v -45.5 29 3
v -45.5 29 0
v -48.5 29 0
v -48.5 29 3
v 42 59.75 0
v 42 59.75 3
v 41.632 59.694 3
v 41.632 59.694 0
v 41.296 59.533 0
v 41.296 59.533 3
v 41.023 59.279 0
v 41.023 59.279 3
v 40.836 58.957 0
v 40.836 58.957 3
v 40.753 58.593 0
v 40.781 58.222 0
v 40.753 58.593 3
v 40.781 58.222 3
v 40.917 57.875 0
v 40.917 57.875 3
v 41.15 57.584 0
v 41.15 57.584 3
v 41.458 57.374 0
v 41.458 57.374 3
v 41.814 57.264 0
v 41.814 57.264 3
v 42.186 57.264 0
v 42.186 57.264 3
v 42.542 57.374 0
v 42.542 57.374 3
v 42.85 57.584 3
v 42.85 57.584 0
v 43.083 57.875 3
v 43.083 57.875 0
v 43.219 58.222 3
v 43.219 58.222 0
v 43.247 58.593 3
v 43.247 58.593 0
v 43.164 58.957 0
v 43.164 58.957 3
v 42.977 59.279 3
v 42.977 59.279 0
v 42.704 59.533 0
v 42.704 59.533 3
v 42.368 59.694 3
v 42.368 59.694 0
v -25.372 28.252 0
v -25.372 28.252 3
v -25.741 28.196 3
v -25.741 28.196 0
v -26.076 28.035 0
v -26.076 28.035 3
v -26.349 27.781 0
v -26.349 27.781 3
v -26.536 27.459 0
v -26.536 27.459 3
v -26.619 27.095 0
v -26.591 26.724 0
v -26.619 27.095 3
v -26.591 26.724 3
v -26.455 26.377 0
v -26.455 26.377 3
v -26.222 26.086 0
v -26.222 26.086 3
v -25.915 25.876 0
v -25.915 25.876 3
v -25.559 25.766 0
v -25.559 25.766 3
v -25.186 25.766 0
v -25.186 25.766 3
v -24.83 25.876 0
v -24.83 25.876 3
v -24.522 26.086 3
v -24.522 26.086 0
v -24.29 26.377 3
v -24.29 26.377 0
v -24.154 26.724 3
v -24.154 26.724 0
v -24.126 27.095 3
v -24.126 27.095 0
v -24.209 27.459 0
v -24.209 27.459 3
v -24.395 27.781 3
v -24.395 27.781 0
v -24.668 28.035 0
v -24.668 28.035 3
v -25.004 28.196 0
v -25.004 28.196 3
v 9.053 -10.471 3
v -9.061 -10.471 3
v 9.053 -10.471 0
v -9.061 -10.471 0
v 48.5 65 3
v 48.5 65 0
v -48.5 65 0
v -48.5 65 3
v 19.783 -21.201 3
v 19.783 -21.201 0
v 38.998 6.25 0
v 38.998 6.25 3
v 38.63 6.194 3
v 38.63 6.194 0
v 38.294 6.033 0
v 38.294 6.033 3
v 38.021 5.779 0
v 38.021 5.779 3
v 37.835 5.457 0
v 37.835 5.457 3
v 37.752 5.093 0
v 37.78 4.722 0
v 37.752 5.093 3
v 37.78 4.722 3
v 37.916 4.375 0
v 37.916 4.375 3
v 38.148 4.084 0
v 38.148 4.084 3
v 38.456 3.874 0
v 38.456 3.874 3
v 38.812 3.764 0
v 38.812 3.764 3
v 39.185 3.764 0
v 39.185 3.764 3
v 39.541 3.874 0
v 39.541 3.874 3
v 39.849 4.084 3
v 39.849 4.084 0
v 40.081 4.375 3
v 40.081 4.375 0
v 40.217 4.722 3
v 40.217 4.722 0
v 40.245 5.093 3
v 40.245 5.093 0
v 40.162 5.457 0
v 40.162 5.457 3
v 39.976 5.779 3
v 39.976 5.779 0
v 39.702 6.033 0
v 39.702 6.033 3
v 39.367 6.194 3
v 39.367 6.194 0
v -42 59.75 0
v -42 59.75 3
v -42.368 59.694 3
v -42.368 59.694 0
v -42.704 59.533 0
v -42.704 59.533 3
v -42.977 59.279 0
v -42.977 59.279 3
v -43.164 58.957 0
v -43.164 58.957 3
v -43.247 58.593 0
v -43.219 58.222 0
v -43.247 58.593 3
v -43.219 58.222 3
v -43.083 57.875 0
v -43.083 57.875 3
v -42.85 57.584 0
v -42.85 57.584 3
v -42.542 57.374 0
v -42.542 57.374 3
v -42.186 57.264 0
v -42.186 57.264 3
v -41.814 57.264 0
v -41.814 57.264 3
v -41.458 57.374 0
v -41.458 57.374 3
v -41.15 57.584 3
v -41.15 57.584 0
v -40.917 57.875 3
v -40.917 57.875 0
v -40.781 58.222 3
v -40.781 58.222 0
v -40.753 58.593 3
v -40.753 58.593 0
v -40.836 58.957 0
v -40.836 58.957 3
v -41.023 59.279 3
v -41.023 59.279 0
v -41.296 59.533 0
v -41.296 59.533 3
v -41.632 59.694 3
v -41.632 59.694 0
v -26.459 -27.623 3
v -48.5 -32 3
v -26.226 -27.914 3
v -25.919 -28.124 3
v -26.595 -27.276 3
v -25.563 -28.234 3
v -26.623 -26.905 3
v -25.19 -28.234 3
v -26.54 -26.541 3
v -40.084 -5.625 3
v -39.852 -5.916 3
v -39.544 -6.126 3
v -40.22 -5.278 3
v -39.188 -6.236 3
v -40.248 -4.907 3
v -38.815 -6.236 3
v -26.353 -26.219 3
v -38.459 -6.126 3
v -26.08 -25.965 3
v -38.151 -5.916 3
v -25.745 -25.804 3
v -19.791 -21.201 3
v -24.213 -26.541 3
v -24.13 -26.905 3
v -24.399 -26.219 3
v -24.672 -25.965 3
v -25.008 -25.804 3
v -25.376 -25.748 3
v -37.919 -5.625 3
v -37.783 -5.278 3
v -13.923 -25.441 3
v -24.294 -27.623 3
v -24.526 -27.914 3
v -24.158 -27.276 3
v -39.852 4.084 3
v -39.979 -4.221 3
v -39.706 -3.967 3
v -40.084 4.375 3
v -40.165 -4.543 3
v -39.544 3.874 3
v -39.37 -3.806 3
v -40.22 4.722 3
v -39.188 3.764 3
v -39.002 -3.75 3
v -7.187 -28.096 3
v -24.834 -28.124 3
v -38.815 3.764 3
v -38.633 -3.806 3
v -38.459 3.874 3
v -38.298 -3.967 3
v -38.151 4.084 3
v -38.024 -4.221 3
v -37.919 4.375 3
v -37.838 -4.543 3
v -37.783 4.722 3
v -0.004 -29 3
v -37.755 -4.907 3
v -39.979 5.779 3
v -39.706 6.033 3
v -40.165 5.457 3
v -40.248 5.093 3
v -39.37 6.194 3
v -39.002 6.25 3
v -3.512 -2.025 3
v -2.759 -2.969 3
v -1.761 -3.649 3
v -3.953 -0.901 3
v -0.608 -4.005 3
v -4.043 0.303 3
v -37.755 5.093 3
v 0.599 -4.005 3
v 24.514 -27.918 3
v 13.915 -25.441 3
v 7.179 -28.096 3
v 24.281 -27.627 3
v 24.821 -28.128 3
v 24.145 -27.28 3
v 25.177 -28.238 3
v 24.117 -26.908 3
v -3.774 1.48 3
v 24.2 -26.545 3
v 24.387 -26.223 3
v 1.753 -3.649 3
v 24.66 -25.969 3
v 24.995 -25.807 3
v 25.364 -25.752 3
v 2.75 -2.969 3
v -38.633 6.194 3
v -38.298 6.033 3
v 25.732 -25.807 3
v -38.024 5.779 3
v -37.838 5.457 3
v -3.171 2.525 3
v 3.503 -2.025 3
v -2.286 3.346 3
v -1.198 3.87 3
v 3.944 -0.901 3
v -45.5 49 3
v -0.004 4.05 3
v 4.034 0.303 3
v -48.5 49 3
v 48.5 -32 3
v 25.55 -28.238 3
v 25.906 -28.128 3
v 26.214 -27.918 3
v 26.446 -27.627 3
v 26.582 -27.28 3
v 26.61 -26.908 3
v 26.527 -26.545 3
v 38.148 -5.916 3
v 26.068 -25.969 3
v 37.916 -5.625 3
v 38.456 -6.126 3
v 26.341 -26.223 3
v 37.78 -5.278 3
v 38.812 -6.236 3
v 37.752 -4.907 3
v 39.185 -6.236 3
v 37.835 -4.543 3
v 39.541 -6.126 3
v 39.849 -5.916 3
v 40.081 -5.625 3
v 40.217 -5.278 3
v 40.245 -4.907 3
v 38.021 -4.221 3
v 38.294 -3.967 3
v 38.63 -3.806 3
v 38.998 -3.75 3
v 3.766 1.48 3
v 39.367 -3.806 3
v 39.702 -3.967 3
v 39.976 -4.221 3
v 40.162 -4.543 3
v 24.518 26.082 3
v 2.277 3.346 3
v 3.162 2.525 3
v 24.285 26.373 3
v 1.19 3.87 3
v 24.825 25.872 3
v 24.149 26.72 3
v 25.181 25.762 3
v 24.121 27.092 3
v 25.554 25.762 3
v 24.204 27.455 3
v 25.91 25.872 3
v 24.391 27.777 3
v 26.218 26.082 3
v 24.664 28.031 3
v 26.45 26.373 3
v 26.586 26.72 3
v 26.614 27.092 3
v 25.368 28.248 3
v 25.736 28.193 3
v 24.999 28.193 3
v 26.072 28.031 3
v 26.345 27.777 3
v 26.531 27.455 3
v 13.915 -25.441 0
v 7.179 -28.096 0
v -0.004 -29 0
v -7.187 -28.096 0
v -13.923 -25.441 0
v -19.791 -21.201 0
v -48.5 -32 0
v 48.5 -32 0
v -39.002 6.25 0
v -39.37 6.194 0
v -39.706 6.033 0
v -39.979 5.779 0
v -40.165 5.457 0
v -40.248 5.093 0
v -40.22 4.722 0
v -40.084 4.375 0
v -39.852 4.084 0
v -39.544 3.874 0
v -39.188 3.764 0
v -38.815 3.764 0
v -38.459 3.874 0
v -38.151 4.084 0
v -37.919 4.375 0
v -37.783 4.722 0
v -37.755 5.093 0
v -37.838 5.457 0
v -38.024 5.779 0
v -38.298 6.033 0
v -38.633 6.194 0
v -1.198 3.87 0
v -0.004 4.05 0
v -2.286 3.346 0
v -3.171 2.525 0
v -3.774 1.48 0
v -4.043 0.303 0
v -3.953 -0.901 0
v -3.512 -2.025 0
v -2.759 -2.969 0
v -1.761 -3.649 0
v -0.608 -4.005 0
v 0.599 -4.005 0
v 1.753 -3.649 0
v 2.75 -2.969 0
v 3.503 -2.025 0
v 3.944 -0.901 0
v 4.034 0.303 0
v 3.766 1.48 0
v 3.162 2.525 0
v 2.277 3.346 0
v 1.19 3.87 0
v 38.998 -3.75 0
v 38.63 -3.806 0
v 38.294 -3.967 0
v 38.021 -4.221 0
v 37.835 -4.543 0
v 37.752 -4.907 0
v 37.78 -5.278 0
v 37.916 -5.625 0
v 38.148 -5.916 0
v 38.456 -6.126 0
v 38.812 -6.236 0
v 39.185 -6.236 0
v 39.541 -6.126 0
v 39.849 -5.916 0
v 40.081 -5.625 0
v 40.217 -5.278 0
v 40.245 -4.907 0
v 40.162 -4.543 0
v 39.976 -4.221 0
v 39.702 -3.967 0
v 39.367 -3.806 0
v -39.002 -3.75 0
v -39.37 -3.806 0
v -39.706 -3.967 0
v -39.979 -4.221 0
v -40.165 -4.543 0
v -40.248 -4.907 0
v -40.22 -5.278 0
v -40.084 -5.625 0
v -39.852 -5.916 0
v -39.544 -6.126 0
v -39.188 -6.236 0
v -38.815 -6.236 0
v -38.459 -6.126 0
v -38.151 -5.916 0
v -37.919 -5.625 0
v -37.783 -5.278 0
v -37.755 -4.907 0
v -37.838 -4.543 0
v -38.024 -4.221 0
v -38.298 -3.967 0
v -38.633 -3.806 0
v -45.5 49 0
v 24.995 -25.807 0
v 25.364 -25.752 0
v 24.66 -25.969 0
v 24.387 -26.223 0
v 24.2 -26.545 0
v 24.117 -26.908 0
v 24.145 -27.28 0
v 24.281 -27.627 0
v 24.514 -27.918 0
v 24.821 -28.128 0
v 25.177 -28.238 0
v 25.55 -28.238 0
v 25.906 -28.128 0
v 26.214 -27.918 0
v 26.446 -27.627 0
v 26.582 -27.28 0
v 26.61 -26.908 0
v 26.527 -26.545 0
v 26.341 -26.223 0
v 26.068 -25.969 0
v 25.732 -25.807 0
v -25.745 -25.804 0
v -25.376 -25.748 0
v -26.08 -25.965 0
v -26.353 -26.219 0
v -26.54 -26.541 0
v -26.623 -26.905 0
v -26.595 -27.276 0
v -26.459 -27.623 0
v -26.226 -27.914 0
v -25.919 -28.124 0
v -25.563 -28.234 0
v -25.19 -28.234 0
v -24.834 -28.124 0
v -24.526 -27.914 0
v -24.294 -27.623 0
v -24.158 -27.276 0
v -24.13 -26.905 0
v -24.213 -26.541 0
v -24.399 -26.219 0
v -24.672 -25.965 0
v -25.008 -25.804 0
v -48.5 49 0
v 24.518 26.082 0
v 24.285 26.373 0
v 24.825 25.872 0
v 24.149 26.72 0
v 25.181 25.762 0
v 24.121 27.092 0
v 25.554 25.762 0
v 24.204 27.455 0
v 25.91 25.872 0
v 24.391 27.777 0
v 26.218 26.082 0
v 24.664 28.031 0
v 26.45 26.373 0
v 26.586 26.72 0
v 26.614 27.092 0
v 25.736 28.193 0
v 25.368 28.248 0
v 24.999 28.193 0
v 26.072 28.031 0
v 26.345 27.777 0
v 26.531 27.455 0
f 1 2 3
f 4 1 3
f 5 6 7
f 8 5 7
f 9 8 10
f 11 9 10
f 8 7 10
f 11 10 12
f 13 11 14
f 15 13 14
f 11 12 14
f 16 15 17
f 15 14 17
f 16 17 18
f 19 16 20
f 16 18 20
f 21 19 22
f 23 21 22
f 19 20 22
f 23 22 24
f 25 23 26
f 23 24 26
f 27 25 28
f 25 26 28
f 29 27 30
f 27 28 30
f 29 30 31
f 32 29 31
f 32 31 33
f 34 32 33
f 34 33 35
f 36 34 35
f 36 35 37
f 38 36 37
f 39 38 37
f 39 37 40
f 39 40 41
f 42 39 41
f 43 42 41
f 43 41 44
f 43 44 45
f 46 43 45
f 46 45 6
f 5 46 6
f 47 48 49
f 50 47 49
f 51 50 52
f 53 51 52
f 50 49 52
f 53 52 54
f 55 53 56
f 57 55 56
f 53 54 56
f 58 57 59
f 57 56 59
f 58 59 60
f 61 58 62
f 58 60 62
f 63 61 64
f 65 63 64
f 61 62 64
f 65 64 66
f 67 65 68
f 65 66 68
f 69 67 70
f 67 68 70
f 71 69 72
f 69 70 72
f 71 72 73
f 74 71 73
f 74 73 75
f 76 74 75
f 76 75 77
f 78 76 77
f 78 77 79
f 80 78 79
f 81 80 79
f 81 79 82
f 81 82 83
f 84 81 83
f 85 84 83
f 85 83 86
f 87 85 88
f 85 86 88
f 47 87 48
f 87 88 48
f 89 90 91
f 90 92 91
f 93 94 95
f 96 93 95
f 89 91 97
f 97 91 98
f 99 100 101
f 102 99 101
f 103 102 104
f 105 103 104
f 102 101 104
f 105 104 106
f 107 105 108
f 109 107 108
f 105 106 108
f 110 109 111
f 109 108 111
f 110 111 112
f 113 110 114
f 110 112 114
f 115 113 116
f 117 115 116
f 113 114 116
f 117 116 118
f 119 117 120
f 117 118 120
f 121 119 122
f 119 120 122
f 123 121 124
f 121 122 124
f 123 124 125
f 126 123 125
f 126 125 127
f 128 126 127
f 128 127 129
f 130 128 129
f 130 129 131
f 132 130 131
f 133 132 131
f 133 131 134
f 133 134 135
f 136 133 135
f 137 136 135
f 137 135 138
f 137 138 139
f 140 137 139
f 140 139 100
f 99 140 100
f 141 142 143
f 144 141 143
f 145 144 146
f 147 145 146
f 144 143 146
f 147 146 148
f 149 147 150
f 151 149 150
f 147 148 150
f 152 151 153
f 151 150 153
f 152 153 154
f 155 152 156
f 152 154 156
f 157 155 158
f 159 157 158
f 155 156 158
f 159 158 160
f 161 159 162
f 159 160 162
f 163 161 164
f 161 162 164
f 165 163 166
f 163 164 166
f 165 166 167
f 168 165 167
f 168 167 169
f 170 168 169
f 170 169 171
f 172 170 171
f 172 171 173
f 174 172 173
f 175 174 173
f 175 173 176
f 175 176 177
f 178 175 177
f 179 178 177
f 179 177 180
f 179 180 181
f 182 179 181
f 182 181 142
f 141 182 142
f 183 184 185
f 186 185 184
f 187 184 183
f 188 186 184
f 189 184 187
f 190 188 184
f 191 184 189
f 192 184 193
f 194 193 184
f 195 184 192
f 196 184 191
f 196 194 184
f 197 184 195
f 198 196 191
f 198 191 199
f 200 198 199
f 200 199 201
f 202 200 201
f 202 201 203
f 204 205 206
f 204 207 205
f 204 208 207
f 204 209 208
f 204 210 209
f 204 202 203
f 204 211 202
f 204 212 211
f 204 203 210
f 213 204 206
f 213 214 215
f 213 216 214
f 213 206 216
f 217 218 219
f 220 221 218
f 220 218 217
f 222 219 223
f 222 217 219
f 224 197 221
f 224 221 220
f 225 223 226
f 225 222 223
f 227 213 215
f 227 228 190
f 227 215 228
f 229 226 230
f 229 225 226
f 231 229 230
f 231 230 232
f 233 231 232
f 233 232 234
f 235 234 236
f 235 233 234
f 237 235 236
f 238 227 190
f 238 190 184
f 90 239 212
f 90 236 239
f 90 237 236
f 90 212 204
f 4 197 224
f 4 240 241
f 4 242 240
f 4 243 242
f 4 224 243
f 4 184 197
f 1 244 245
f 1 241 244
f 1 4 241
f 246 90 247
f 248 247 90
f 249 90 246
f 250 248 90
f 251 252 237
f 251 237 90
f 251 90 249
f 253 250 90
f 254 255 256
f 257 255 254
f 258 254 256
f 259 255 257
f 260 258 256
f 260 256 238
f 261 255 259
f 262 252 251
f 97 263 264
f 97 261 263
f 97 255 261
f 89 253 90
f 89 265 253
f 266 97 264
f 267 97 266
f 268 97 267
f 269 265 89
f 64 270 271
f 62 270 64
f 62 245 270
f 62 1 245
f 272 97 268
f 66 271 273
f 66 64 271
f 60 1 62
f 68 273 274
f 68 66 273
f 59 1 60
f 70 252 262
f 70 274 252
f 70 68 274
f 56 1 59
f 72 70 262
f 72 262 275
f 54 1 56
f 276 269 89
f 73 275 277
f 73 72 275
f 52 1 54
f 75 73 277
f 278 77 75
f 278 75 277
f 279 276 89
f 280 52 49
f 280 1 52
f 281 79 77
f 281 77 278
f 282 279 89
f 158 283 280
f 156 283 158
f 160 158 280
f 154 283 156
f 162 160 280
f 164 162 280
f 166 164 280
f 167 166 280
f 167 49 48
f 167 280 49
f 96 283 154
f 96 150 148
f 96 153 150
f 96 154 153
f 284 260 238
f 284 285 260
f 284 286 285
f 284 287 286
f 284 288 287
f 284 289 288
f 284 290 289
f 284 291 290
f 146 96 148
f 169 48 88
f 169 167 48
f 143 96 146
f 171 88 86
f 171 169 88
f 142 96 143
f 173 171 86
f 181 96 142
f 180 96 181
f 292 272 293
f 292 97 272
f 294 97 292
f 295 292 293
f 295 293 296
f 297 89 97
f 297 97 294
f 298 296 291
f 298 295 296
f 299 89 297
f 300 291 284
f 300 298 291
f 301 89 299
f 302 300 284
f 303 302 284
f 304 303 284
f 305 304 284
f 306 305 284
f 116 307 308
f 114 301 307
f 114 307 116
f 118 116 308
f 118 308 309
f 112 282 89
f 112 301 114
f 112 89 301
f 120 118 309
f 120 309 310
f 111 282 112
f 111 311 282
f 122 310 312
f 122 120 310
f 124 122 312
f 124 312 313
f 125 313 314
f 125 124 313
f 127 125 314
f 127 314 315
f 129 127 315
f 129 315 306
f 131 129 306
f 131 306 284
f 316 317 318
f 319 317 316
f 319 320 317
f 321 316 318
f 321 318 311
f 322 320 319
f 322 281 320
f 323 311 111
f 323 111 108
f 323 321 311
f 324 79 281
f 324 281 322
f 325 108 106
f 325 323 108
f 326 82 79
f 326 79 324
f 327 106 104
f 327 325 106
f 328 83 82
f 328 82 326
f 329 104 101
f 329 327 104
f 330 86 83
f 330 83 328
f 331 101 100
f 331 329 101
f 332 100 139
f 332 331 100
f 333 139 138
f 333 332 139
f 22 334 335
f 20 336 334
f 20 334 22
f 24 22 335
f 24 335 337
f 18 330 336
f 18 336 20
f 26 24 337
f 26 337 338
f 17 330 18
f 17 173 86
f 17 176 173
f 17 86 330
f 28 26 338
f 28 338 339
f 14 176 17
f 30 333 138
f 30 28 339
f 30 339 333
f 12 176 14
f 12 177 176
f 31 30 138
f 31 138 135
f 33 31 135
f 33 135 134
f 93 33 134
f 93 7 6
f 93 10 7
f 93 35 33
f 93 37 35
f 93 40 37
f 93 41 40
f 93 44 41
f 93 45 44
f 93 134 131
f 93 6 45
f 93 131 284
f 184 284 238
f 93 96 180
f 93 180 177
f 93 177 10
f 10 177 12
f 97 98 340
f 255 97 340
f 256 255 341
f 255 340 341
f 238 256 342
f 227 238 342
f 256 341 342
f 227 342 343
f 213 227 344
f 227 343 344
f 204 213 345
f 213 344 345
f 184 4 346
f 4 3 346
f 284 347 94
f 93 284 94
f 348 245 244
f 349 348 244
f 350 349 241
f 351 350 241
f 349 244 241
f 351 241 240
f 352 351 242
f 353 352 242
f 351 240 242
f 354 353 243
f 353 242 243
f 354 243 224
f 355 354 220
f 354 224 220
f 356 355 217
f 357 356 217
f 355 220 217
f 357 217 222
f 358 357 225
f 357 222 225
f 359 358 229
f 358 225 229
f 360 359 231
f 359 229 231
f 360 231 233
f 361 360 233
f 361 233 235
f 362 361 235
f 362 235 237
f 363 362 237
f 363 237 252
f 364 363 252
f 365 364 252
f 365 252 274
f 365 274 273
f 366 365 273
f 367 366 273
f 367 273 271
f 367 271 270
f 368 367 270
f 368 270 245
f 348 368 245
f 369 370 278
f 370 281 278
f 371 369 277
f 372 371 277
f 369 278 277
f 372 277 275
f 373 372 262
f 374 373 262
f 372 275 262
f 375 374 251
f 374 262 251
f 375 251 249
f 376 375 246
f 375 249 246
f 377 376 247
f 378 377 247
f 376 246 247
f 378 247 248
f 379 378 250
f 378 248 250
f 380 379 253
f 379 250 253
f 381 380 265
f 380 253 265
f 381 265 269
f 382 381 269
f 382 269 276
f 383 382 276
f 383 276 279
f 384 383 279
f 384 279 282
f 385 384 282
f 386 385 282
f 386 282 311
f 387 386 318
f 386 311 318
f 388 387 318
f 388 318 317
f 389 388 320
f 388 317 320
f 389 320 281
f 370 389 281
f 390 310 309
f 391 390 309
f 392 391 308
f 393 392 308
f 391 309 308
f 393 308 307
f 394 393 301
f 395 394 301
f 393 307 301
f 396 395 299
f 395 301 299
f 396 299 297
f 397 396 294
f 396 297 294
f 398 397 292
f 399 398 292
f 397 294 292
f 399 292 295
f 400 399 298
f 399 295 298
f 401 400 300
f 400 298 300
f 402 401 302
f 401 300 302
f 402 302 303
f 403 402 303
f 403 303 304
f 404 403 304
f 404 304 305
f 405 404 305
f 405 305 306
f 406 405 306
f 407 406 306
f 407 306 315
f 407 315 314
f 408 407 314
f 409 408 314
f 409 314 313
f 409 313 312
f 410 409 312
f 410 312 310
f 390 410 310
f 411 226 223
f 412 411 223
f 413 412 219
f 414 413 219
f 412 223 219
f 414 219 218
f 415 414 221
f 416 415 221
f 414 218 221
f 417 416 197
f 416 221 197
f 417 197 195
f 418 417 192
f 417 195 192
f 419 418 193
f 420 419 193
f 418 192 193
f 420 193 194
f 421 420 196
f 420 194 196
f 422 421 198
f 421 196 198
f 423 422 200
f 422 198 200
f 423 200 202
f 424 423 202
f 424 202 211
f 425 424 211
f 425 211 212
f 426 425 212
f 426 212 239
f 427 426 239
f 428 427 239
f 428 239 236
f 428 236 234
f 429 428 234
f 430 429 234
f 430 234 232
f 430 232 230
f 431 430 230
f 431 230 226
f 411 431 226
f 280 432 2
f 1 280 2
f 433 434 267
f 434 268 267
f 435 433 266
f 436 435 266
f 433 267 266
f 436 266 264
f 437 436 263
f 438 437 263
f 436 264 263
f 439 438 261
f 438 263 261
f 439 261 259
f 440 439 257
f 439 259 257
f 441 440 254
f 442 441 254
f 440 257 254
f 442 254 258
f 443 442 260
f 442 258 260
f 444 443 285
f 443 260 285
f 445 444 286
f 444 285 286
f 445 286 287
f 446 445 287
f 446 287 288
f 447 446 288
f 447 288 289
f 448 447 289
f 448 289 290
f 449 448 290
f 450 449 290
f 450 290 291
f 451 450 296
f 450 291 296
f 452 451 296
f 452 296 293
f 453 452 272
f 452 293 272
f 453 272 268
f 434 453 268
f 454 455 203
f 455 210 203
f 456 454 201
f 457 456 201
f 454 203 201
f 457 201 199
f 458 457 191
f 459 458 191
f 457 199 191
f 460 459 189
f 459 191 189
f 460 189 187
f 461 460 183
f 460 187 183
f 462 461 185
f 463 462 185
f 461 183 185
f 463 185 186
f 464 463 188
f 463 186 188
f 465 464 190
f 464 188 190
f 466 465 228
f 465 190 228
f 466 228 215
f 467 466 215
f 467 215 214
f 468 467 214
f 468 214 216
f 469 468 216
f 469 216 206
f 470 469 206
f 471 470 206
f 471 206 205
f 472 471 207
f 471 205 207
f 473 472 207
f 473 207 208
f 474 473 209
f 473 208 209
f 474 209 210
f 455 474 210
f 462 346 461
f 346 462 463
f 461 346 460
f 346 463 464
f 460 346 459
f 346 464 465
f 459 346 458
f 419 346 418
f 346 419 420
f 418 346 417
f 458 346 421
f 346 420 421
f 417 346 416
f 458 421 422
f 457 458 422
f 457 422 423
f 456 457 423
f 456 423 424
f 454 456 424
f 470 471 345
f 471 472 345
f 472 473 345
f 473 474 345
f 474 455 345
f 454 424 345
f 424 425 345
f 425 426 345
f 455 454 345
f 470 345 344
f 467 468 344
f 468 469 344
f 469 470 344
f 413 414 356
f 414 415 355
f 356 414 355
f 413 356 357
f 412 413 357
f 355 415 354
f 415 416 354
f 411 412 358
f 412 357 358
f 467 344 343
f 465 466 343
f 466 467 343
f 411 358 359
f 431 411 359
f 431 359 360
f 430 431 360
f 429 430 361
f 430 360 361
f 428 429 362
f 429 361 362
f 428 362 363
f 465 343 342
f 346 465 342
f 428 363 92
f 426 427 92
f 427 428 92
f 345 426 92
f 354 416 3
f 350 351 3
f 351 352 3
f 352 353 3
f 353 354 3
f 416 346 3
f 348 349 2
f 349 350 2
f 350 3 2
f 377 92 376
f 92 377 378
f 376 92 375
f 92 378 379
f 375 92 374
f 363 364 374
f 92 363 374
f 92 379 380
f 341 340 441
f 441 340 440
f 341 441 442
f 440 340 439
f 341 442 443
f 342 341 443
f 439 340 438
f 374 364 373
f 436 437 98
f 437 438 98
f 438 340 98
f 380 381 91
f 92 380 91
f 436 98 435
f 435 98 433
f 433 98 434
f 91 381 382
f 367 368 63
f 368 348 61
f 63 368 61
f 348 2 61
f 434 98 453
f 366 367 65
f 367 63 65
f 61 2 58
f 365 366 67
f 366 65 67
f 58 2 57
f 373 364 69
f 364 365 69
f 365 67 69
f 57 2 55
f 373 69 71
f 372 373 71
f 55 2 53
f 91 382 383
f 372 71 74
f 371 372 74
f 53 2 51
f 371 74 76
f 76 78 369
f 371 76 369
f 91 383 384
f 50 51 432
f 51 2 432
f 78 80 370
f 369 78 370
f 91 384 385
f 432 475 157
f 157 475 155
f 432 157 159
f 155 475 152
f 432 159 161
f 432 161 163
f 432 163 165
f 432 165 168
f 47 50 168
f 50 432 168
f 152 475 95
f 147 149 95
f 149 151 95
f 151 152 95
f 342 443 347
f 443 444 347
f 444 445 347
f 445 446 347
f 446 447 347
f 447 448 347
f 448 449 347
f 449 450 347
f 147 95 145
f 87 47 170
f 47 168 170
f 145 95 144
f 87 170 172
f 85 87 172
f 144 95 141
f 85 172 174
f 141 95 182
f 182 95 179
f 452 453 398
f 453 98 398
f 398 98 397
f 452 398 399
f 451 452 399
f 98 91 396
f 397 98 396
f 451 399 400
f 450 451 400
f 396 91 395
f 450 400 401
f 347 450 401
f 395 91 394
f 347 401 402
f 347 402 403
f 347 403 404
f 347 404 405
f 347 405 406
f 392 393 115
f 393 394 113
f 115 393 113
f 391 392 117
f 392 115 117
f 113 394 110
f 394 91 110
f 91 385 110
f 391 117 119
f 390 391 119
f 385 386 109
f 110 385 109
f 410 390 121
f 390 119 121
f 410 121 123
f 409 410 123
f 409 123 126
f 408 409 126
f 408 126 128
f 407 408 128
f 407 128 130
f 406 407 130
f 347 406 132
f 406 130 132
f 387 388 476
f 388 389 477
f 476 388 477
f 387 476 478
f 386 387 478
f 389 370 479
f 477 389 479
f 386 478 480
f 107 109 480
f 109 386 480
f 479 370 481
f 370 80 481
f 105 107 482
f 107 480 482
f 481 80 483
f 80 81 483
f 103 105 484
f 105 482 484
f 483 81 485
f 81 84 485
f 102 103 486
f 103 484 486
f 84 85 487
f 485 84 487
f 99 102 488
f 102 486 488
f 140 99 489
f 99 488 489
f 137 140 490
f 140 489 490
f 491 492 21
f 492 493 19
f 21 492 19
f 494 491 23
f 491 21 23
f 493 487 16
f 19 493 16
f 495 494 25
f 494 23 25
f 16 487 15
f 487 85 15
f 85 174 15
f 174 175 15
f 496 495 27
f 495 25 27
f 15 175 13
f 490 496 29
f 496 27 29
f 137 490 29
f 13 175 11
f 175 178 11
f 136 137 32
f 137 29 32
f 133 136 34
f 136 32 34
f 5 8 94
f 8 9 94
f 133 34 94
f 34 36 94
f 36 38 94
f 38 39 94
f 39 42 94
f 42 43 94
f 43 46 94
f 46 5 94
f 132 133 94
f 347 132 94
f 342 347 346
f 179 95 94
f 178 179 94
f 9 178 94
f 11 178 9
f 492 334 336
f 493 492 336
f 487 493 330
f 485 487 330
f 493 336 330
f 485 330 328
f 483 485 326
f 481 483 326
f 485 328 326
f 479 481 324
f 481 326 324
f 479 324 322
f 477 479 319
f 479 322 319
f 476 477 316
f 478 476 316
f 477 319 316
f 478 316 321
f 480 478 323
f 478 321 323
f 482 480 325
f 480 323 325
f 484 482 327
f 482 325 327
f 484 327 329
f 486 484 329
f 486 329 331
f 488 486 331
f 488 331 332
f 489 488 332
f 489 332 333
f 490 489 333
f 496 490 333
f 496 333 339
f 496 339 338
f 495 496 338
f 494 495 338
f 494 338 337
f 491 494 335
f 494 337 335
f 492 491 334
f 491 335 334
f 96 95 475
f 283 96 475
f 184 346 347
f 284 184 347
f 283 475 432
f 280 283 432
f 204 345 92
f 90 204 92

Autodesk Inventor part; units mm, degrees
ref_plane "YZ Plane" through (0, 0, 0) normal (1, 0, 0) x (0, 1, 0)
ref_plane "XZ Plane" through (0, 0, 0) normal (0, 1, 0) x (-1, 0, 0)
ref_plane "XY Plane" through (0, 0, 0) normal (0, 0, 1) x (1, 0, 0)
sketch "Boceto1" plane through (0, 0, 0) normal (0, 0, 1) x (1, 0, 0)
  line L0 (48.5, -35) -> (48.5, 68) projected
  line L1 (48.5, 65) -> (35.5, 65) projected
  line L2 (-48.5, 68) -> (-48.5, -35) projected
  line L3 (-48.5, -32) -> (48.5, -32) projected
  line L4 (-48.5, -32) -> (48.5, -32)
  line L5 (48.5, -32) -> (48.5, 65)
  line L6 (48.5, 65) -> (-48.5, 65)
  line L7 (-48.5, 65) -> (-48.5, -32)
  point P0 (0, 0)
  point P1 (-48.5, 65)
extrude "Extrusión1" add sketch "Boceto1" along normal blind 3
sketch "Boceto5" plane through (0, 0, 0) normal (0, 0, -1) x (-1, 0, 0)
  line L0 (11.3801, -12.7901) -> (-11.3717, -12.7901)
  line L1 (19.791, -21.201) -> (5.6217, -7.0317) projected
  line L2 (-5.6132, -7.0317) -> (-19.7826, -21.201) projected
  line L3 (9.0613, -10.4713) -> (-9.0529, -10.4713)
  arc A0 (-19.7826, -21.201) -> (19.791, -21.201) centre (0.0042, 0) ccw projected
  point P0 (0, 0)
extrude "Extrusión5" cut sketch "Boceto5" against normal through all
sketch "Boceto6" plane through (0, 0, 0) normal (0, 0, -1) x (-1, 0, 0)
  arc A0 (-19.7826, -21.201) -> (19.791, -21.201) centre (0.0042, 0) ccw projected
  circle A1 centre (-38.9983, 5) radius 1.25 projected
  circle A2 centre (-38.9983, 5) radius 1.25 projected
  circle A3 centre (-38.9983, -5) radius 1.25 projected
  circle A4 centre (39.0017, 5) radius 1.25 projected
  circle A5 centre (39.0017, 5) radius 1.25 projected
  circle A6 centre (39.0017, -5) radius 1.25 projected
  point P0 (0, 0)
hole "Agujero1" at (-0.0042, 0, 0) direction (0, 0, 1) diameter 8.1 end through all
sketch "Boceto7" plane through (0, 0, 0) normal (0, 0, -1) x (-1, 0, 0)
  circle A0 centre (25.3722, 27.0019) radius 1.5 projected
  circle A1 centre (0.0042, 0) radius 4.05 projected
  arc A2 (-19.7826, -21.201) -> (19.791, -21.201) centre (0.0042, 0) ccw projected
  line L0 (-19.7826, -21.201) -> (-9.0529, -10.4713) projected
  line L1 (-9.0529, -10.4713) -> (9.0613, -10.4713) projected
  line L2 (9.0613, -10.4713) -> (19.791, -21.201) projected
  line L3 (48.5, 65) -> (48.5, -32) projected
  line L4 (-48.5, 65) -> (48.5, 65) projected
  line L5 (-48.5, -32) -> (-48.5, 65) projected
  line L6 (48.5, -32) -> (-48.5, -32) projected
  circle A3 centre (-25.3678, 26.9981) radius 1.5 projected
  circle A4 centre (-25.3638, -27.0019) radius 1.25 projected
  circle A5 centre (25.3762, -26.9981) radius 1.25 projected
  circle A6 centre (-42, 58.5) radius 1.25 projected
  circle A7 centre (42, 58.5) radius 1.25 projected
  circle A8 centre (-38.9983, 5) radius 1.25 projected
  circle A9 centre (-38.9983, 5) radius 1.25 projected
  circle A10 centre (-38.9983, -5) radius 1.25 projected
  circle A11 centre (39.0017, -5) radius 1.25 projected
  circle A12 centre (39.0017, 5) radius 1.25 projected
  point P0 (0, 0)
hole "Agujero2" at (-25.3762, -26.9981, 0) at (25.3638, -27.0019, 0) at (25.3678, 26.9981, 0) at (-25.3722, 27.0019, 0) at (42, 58.5, 0) at (-42, 58.5, 0) at (38.9983, -5, 0) at (38.9983, 5, 0) at (-39.0017, -5, 0) at (-39.0017, 5, 0) direction (0, 0, 1) diameter 2.5 end through all
sketch "Boceto9" plane through (0, 0, 0) normal (0, 0, -1) x (-1, 0, 0)
  line L0 (48.5, 65) -> (48.5, 49)
  line L1 (48.5, 65) -> (48.5, -32) projected
  line L2 (48.5, 49) -> (45.5, 49)
  line L3 (45.5, 49) -> (45.5, 29)
  line L4 (45.5, 29) -> (48.5, 29)
  point P0 (0, 0)
  dimension "d32" = 16
  dimension "d33" = 3
  dimension "d34" = 20
extrude "Extrusión7" cut sketch "Boceto9" against normal blind 10
properties part number "Madera intermedia"
